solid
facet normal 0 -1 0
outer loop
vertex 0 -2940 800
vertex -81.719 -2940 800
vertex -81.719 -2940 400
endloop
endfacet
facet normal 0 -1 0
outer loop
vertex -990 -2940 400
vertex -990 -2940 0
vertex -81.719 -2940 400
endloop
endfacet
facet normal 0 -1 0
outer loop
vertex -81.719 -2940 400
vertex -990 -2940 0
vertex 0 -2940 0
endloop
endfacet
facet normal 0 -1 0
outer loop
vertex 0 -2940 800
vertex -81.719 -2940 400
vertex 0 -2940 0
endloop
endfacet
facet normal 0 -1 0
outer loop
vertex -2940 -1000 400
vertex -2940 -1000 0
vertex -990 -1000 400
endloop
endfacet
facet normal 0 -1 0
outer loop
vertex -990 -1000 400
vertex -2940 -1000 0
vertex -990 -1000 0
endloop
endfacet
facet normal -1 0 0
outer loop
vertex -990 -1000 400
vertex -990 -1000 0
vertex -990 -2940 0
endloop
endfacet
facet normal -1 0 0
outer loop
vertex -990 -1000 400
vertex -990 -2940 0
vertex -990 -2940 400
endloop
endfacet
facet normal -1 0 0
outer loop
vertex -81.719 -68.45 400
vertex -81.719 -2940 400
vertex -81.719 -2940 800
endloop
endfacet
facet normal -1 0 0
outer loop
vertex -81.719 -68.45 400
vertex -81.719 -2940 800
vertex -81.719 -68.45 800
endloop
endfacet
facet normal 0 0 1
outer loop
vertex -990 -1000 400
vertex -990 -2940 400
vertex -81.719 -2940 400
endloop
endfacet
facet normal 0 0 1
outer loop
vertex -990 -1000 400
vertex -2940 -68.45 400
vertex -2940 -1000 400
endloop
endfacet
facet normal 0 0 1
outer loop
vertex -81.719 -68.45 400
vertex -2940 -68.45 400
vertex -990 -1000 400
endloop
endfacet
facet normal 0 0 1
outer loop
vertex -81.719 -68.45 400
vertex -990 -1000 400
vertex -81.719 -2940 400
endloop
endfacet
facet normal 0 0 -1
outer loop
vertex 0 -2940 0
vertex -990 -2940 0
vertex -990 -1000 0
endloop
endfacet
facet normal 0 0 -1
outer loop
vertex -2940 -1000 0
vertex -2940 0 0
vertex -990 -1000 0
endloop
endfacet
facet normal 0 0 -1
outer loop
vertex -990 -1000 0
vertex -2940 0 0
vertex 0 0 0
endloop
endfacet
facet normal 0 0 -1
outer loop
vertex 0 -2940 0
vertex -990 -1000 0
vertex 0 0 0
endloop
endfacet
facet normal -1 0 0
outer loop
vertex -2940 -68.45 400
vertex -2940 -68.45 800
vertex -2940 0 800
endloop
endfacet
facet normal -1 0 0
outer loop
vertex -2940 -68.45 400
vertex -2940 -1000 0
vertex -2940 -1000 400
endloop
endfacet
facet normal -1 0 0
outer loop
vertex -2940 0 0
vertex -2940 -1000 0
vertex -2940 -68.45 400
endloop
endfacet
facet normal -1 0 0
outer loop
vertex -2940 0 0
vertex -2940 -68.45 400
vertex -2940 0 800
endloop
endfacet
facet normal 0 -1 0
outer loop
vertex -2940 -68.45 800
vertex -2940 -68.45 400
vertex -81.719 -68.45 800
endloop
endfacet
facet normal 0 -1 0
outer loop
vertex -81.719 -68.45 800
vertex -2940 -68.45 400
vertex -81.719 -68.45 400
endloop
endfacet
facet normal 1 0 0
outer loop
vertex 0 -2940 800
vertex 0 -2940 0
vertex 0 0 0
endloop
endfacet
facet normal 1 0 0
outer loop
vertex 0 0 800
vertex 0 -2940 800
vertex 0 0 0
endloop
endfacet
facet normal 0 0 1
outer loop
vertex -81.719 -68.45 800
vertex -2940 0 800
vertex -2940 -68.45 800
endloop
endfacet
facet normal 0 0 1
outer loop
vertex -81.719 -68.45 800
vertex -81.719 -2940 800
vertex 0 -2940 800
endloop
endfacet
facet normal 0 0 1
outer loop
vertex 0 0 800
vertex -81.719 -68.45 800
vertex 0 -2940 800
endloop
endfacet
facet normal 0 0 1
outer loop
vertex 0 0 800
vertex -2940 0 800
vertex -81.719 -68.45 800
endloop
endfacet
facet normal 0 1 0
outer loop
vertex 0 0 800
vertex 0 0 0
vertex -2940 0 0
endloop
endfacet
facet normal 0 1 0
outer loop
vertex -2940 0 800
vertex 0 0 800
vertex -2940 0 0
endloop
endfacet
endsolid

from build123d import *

# Parameters (mm, degrees)
F0_W     = 2940
F0_H     = 1000
F1_DEPTH = 400
F2_W     = 990
F2_H     = 400
F3_DEPTH = 1940
F4_W     = 2858.2814434171
F4_H     = 68.4500560164
F4_W_2   = 81.7185565829
F4_H_2   = 2871.5499439836
F5_DEPTH = 400


with BuildPart() as f1:
    # F0 (on Top) → F1 (new body)
    with BuildSketch(Plane.XY):
        with Locations((-1470, -500)):
            Rectangle(F0_W, F0_H)
    extrude(amount=F1_DEPTH)

    # F2 (on face) → F3 (join)
    with BuildSketch(Plane.XZ.offset(1000)):
        with Locations((-495, 200)):
            Rectangle(F2_W, F2_H)
    extrude(amount=F3_DEPTH)

    # F4 (on face) → F5 (join)
    with BuildSketch(Plane.XY.offset(400)):
        with Locations((-1510.8592782915, -34.2250280082)):
            Rectangle(F4_W, F4_H)
        with Locations((-40.8592782915, -34.2250280082)):
            Rectangle(F4_W_2, F4_H)
        with Locations((-40.8592782915, -1504.2250280082)):
            Rectangle(F4_W_2, F4_H_2)
    extrude(amount=F5_DEPTH)


solid = f1.part
